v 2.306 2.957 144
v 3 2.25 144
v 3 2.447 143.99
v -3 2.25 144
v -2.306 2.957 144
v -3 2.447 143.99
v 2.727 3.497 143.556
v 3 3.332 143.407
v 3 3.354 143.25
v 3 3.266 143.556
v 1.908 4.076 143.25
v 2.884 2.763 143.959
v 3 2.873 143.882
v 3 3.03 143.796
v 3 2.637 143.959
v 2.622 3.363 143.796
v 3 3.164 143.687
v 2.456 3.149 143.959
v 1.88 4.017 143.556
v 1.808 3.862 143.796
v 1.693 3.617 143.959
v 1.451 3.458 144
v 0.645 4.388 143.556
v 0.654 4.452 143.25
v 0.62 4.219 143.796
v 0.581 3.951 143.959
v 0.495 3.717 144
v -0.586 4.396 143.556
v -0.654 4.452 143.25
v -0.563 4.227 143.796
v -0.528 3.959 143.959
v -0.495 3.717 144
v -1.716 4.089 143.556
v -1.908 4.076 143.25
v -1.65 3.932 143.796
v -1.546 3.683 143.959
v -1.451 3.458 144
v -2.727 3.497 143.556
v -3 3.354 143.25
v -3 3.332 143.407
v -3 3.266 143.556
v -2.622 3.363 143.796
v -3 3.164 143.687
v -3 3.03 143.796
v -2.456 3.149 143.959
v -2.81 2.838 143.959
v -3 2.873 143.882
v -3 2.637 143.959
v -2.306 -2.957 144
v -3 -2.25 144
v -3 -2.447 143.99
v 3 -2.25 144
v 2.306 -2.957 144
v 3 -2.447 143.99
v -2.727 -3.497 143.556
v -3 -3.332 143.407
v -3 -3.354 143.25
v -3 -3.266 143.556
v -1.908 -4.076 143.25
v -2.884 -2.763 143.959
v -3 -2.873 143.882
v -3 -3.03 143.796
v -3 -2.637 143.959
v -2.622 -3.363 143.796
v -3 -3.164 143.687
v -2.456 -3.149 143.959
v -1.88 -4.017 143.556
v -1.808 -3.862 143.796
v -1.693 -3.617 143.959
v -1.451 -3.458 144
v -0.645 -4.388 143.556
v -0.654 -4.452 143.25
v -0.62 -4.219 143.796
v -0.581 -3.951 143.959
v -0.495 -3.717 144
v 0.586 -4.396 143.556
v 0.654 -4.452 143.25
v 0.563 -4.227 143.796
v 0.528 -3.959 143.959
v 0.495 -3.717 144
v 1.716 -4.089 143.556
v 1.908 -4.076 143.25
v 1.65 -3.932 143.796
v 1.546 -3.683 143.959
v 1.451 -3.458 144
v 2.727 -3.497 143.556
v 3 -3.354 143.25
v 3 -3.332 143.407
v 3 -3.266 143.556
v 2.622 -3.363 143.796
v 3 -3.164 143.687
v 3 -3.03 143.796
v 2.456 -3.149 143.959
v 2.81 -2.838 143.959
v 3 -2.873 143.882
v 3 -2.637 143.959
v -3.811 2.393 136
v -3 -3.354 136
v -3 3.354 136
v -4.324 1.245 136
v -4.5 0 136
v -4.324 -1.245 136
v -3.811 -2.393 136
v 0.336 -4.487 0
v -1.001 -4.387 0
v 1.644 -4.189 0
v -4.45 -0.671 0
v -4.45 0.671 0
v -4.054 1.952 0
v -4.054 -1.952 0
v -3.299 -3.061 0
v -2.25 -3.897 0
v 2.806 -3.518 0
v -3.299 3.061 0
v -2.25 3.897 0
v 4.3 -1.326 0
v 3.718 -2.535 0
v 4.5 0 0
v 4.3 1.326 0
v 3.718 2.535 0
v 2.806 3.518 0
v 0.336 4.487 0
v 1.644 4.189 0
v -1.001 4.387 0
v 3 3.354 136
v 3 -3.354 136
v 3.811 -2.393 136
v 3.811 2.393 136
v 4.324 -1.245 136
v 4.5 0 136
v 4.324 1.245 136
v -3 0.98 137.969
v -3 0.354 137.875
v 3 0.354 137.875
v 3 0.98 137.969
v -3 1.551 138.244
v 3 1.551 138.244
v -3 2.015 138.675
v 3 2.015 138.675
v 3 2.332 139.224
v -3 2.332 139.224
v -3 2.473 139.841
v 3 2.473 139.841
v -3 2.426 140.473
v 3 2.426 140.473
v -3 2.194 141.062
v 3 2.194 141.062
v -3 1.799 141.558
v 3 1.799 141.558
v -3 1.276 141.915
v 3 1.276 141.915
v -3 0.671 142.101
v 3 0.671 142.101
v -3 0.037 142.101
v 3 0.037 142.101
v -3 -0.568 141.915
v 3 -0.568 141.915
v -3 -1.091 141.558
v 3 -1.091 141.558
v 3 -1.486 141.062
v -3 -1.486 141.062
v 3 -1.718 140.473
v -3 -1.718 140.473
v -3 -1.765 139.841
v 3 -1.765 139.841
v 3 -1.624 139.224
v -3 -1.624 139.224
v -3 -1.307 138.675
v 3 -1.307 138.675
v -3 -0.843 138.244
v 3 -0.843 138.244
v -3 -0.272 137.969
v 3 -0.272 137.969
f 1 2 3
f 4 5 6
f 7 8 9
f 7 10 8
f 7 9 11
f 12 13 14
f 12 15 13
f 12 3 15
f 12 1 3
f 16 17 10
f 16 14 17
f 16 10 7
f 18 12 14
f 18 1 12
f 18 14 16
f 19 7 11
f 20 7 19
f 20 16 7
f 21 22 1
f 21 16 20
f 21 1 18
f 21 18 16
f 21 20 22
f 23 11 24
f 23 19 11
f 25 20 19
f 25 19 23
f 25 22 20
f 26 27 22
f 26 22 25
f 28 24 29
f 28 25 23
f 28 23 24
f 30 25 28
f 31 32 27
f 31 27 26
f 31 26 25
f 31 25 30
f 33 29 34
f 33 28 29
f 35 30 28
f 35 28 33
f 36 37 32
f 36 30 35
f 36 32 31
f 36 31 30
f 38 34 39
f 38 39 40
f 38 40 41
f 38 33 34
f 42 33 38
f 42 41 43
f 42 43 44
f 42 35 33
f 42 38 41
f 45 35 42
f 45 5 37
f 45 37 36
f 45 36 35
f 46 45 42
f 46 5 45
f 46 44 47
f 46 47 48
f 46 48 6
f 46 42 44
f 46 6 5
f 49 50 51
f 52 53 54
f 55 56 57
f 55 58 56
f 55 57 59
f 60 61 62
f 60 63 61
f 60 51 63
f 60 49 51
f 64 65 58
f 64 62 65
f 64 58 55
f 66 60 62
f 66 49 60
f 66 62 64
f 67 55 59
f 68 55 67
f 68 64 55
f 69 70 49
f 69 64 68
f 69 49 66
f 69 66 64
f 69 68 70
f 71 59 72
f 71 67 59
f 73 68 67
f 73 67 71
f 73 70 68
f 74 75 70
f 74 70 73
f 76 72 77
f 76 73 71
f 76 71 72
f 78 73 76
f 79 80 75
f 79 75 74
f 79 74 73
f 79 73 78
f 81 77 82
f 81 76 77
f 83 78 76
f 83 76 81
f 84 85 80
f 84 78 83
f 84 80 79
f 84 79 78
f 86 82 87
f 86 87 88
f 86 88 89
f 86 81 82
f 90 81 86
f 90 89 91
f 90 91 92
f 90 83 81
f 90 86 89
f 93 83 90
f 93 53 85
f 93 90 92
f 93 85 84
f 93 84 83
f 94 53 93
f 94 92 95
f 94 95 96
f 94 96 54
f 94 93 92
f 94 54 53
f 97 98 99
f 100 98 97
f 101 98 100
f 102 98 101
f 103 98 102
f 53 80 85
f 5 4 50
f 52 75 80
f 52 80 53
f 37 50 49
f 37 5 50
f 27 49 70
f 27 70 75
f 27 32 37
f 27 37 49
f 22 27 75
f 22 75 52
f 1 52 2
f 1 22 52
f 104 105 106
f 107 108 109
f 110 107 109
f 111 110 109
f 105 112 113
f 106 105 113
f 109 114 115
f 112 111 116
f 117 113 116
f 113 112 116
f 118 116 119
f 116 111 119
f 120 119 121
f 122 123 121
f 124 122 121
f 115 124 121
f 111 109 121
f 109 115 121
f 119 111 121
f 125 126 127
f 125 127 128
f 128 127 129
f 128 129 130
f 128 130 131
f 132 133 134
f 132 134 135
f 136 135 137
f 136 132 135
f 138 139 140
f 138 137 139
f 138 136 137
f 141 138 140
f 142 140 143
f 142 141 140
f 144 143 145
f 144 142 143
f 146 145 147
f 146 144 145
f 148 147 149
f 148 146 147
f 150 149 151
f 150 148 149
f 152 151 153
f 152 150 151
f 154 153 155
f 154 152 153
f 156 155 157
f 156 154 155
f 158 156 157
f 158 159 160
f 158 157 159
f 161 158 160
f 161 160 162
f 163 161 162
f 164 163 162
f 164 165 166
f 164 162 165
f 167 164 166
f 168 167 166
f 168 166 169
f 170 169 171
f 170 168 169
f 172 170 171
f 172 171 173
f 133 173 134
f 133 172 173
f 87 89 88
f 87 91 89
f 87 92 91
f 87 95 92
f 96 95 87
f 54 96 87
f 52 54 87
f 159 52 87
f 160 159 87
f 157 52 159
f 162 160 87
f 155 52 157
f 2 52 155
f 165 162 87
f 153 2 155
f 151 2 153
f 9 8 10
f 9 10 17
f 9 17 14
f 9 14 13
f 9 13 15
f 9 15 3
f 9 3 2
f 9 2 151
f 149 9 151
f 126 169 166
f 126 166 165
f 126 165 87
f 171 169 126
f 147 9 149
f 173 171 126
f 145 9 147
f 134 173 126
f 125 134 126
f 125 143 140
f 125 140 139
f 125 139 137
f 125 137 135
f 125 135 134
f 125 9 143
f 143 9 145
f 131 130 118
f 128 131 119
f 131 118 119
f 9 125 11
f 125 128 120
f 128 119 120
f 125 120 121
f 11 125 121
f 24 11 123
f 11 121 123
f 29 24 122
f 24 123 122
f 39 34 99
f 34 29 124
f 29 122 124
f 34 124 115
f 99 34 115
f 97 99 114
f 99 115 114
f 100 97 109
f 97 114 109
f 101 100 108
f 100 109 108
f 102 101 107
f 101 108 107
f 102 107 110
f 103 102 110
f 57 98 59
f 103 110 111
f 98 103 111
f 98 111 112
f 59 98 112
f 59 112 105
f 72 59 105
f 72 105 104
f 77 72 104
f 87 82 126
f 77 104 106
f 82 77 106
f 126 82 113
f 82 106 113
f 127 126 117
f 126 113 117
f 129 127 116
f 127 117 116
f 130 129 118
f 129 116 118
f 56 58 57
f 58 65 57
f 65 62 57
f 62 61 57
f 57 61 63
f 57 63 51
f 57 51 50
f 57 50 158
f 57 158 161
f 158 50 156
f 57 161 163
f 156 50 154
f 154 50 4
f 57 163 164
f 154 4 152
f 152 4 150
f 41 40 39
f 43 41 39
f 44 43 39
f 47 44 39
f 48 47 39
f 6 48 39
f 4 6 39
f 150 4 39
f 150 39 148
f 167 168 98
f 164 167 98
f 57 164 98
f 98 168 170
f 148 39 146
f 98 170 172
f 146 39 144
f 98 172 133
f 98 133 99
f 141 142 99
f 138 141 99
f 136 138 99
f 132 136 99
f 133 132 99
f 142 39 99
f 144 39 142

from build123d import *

# Parameters (mm, degrees)
SKETCH1_R               = 4.5
BOSS_EXTRUDE1_DEPTH     = 144
CUT_EXTRUDE1_START      = -3
SKETCH3_W               = 8
SKETCH3_H               = 9
CUT_EXTRUDE1_DEPTH      = 1.5
FILLET1_R               = 0.75
CUT_EXTRUDE2_DEPTH      = 145.265380565
CUT_EXTRUDE2_DEPTH_BACK = 145.265380565
SKETCH4_R               = 2.125


with BuildPart() as part:
    # Sketch1 → Boss-Extrude1 (new body)
    with BuildSketch(Plane.XY):
        Circle(SKETCH1_R)
    extrude(amount=BOSS_EXTRUDE1_DEPTH)

    # Sketch3 → Cut-Extrude1 (cut)
    with BuildSketch(Plane(origin=(0, 0, 0), x_dir=(0, 0, -1), z_dir=(1, 0, 0)).offset(CUT_EXTRUDE1_START)):
        with Locations((-140, 0)):
            Rectangle(SKETCH3_W, SKETCH3_H)
    cut_extrude1 = extrude(amount=-CUT_EXTRUDE1_DEPTH, mode=Mode.SUBTRACT)

    # Mirror1: Cut-Extrude1 across plane
    add(cut_extrude1.mirror(Plane(origin=(0, 0, 0), x_dir=(0, 0, 1), z_dir=(1, 0, 0))), mode=Mode.SUBTRACT)

    # Fillet1
    fillet1_edges = [part.edges().sort_by_distance(p)[0] for p in [
        (0, 4.5, 144),
        (0, -4.5, 144),
    ]]
    fillet(fillet1_edges, radius=FILLET1_R)

    # Sketch4 → Cut-Extrude2 (cut, two sides: drawn at the far end of the back side and taken through both)
    with BuildSketch(Plane(origin=(3, 0, 0), x_dir=(0, 0, -1), z_dir=(1, 0, 0)).offset(-CUT_EXTRUDE2_DEPTH_BACK)):
        with Locations((-140, 0.354101966)):
            Circle(SKETCH4_R)
    extrude(amount=CUT_EXTRUDE2_DEPTH + CUT_EXTRUDE2_DEPTH_BACK, mode=Mode.SUBTRACT)


solid = part.part
